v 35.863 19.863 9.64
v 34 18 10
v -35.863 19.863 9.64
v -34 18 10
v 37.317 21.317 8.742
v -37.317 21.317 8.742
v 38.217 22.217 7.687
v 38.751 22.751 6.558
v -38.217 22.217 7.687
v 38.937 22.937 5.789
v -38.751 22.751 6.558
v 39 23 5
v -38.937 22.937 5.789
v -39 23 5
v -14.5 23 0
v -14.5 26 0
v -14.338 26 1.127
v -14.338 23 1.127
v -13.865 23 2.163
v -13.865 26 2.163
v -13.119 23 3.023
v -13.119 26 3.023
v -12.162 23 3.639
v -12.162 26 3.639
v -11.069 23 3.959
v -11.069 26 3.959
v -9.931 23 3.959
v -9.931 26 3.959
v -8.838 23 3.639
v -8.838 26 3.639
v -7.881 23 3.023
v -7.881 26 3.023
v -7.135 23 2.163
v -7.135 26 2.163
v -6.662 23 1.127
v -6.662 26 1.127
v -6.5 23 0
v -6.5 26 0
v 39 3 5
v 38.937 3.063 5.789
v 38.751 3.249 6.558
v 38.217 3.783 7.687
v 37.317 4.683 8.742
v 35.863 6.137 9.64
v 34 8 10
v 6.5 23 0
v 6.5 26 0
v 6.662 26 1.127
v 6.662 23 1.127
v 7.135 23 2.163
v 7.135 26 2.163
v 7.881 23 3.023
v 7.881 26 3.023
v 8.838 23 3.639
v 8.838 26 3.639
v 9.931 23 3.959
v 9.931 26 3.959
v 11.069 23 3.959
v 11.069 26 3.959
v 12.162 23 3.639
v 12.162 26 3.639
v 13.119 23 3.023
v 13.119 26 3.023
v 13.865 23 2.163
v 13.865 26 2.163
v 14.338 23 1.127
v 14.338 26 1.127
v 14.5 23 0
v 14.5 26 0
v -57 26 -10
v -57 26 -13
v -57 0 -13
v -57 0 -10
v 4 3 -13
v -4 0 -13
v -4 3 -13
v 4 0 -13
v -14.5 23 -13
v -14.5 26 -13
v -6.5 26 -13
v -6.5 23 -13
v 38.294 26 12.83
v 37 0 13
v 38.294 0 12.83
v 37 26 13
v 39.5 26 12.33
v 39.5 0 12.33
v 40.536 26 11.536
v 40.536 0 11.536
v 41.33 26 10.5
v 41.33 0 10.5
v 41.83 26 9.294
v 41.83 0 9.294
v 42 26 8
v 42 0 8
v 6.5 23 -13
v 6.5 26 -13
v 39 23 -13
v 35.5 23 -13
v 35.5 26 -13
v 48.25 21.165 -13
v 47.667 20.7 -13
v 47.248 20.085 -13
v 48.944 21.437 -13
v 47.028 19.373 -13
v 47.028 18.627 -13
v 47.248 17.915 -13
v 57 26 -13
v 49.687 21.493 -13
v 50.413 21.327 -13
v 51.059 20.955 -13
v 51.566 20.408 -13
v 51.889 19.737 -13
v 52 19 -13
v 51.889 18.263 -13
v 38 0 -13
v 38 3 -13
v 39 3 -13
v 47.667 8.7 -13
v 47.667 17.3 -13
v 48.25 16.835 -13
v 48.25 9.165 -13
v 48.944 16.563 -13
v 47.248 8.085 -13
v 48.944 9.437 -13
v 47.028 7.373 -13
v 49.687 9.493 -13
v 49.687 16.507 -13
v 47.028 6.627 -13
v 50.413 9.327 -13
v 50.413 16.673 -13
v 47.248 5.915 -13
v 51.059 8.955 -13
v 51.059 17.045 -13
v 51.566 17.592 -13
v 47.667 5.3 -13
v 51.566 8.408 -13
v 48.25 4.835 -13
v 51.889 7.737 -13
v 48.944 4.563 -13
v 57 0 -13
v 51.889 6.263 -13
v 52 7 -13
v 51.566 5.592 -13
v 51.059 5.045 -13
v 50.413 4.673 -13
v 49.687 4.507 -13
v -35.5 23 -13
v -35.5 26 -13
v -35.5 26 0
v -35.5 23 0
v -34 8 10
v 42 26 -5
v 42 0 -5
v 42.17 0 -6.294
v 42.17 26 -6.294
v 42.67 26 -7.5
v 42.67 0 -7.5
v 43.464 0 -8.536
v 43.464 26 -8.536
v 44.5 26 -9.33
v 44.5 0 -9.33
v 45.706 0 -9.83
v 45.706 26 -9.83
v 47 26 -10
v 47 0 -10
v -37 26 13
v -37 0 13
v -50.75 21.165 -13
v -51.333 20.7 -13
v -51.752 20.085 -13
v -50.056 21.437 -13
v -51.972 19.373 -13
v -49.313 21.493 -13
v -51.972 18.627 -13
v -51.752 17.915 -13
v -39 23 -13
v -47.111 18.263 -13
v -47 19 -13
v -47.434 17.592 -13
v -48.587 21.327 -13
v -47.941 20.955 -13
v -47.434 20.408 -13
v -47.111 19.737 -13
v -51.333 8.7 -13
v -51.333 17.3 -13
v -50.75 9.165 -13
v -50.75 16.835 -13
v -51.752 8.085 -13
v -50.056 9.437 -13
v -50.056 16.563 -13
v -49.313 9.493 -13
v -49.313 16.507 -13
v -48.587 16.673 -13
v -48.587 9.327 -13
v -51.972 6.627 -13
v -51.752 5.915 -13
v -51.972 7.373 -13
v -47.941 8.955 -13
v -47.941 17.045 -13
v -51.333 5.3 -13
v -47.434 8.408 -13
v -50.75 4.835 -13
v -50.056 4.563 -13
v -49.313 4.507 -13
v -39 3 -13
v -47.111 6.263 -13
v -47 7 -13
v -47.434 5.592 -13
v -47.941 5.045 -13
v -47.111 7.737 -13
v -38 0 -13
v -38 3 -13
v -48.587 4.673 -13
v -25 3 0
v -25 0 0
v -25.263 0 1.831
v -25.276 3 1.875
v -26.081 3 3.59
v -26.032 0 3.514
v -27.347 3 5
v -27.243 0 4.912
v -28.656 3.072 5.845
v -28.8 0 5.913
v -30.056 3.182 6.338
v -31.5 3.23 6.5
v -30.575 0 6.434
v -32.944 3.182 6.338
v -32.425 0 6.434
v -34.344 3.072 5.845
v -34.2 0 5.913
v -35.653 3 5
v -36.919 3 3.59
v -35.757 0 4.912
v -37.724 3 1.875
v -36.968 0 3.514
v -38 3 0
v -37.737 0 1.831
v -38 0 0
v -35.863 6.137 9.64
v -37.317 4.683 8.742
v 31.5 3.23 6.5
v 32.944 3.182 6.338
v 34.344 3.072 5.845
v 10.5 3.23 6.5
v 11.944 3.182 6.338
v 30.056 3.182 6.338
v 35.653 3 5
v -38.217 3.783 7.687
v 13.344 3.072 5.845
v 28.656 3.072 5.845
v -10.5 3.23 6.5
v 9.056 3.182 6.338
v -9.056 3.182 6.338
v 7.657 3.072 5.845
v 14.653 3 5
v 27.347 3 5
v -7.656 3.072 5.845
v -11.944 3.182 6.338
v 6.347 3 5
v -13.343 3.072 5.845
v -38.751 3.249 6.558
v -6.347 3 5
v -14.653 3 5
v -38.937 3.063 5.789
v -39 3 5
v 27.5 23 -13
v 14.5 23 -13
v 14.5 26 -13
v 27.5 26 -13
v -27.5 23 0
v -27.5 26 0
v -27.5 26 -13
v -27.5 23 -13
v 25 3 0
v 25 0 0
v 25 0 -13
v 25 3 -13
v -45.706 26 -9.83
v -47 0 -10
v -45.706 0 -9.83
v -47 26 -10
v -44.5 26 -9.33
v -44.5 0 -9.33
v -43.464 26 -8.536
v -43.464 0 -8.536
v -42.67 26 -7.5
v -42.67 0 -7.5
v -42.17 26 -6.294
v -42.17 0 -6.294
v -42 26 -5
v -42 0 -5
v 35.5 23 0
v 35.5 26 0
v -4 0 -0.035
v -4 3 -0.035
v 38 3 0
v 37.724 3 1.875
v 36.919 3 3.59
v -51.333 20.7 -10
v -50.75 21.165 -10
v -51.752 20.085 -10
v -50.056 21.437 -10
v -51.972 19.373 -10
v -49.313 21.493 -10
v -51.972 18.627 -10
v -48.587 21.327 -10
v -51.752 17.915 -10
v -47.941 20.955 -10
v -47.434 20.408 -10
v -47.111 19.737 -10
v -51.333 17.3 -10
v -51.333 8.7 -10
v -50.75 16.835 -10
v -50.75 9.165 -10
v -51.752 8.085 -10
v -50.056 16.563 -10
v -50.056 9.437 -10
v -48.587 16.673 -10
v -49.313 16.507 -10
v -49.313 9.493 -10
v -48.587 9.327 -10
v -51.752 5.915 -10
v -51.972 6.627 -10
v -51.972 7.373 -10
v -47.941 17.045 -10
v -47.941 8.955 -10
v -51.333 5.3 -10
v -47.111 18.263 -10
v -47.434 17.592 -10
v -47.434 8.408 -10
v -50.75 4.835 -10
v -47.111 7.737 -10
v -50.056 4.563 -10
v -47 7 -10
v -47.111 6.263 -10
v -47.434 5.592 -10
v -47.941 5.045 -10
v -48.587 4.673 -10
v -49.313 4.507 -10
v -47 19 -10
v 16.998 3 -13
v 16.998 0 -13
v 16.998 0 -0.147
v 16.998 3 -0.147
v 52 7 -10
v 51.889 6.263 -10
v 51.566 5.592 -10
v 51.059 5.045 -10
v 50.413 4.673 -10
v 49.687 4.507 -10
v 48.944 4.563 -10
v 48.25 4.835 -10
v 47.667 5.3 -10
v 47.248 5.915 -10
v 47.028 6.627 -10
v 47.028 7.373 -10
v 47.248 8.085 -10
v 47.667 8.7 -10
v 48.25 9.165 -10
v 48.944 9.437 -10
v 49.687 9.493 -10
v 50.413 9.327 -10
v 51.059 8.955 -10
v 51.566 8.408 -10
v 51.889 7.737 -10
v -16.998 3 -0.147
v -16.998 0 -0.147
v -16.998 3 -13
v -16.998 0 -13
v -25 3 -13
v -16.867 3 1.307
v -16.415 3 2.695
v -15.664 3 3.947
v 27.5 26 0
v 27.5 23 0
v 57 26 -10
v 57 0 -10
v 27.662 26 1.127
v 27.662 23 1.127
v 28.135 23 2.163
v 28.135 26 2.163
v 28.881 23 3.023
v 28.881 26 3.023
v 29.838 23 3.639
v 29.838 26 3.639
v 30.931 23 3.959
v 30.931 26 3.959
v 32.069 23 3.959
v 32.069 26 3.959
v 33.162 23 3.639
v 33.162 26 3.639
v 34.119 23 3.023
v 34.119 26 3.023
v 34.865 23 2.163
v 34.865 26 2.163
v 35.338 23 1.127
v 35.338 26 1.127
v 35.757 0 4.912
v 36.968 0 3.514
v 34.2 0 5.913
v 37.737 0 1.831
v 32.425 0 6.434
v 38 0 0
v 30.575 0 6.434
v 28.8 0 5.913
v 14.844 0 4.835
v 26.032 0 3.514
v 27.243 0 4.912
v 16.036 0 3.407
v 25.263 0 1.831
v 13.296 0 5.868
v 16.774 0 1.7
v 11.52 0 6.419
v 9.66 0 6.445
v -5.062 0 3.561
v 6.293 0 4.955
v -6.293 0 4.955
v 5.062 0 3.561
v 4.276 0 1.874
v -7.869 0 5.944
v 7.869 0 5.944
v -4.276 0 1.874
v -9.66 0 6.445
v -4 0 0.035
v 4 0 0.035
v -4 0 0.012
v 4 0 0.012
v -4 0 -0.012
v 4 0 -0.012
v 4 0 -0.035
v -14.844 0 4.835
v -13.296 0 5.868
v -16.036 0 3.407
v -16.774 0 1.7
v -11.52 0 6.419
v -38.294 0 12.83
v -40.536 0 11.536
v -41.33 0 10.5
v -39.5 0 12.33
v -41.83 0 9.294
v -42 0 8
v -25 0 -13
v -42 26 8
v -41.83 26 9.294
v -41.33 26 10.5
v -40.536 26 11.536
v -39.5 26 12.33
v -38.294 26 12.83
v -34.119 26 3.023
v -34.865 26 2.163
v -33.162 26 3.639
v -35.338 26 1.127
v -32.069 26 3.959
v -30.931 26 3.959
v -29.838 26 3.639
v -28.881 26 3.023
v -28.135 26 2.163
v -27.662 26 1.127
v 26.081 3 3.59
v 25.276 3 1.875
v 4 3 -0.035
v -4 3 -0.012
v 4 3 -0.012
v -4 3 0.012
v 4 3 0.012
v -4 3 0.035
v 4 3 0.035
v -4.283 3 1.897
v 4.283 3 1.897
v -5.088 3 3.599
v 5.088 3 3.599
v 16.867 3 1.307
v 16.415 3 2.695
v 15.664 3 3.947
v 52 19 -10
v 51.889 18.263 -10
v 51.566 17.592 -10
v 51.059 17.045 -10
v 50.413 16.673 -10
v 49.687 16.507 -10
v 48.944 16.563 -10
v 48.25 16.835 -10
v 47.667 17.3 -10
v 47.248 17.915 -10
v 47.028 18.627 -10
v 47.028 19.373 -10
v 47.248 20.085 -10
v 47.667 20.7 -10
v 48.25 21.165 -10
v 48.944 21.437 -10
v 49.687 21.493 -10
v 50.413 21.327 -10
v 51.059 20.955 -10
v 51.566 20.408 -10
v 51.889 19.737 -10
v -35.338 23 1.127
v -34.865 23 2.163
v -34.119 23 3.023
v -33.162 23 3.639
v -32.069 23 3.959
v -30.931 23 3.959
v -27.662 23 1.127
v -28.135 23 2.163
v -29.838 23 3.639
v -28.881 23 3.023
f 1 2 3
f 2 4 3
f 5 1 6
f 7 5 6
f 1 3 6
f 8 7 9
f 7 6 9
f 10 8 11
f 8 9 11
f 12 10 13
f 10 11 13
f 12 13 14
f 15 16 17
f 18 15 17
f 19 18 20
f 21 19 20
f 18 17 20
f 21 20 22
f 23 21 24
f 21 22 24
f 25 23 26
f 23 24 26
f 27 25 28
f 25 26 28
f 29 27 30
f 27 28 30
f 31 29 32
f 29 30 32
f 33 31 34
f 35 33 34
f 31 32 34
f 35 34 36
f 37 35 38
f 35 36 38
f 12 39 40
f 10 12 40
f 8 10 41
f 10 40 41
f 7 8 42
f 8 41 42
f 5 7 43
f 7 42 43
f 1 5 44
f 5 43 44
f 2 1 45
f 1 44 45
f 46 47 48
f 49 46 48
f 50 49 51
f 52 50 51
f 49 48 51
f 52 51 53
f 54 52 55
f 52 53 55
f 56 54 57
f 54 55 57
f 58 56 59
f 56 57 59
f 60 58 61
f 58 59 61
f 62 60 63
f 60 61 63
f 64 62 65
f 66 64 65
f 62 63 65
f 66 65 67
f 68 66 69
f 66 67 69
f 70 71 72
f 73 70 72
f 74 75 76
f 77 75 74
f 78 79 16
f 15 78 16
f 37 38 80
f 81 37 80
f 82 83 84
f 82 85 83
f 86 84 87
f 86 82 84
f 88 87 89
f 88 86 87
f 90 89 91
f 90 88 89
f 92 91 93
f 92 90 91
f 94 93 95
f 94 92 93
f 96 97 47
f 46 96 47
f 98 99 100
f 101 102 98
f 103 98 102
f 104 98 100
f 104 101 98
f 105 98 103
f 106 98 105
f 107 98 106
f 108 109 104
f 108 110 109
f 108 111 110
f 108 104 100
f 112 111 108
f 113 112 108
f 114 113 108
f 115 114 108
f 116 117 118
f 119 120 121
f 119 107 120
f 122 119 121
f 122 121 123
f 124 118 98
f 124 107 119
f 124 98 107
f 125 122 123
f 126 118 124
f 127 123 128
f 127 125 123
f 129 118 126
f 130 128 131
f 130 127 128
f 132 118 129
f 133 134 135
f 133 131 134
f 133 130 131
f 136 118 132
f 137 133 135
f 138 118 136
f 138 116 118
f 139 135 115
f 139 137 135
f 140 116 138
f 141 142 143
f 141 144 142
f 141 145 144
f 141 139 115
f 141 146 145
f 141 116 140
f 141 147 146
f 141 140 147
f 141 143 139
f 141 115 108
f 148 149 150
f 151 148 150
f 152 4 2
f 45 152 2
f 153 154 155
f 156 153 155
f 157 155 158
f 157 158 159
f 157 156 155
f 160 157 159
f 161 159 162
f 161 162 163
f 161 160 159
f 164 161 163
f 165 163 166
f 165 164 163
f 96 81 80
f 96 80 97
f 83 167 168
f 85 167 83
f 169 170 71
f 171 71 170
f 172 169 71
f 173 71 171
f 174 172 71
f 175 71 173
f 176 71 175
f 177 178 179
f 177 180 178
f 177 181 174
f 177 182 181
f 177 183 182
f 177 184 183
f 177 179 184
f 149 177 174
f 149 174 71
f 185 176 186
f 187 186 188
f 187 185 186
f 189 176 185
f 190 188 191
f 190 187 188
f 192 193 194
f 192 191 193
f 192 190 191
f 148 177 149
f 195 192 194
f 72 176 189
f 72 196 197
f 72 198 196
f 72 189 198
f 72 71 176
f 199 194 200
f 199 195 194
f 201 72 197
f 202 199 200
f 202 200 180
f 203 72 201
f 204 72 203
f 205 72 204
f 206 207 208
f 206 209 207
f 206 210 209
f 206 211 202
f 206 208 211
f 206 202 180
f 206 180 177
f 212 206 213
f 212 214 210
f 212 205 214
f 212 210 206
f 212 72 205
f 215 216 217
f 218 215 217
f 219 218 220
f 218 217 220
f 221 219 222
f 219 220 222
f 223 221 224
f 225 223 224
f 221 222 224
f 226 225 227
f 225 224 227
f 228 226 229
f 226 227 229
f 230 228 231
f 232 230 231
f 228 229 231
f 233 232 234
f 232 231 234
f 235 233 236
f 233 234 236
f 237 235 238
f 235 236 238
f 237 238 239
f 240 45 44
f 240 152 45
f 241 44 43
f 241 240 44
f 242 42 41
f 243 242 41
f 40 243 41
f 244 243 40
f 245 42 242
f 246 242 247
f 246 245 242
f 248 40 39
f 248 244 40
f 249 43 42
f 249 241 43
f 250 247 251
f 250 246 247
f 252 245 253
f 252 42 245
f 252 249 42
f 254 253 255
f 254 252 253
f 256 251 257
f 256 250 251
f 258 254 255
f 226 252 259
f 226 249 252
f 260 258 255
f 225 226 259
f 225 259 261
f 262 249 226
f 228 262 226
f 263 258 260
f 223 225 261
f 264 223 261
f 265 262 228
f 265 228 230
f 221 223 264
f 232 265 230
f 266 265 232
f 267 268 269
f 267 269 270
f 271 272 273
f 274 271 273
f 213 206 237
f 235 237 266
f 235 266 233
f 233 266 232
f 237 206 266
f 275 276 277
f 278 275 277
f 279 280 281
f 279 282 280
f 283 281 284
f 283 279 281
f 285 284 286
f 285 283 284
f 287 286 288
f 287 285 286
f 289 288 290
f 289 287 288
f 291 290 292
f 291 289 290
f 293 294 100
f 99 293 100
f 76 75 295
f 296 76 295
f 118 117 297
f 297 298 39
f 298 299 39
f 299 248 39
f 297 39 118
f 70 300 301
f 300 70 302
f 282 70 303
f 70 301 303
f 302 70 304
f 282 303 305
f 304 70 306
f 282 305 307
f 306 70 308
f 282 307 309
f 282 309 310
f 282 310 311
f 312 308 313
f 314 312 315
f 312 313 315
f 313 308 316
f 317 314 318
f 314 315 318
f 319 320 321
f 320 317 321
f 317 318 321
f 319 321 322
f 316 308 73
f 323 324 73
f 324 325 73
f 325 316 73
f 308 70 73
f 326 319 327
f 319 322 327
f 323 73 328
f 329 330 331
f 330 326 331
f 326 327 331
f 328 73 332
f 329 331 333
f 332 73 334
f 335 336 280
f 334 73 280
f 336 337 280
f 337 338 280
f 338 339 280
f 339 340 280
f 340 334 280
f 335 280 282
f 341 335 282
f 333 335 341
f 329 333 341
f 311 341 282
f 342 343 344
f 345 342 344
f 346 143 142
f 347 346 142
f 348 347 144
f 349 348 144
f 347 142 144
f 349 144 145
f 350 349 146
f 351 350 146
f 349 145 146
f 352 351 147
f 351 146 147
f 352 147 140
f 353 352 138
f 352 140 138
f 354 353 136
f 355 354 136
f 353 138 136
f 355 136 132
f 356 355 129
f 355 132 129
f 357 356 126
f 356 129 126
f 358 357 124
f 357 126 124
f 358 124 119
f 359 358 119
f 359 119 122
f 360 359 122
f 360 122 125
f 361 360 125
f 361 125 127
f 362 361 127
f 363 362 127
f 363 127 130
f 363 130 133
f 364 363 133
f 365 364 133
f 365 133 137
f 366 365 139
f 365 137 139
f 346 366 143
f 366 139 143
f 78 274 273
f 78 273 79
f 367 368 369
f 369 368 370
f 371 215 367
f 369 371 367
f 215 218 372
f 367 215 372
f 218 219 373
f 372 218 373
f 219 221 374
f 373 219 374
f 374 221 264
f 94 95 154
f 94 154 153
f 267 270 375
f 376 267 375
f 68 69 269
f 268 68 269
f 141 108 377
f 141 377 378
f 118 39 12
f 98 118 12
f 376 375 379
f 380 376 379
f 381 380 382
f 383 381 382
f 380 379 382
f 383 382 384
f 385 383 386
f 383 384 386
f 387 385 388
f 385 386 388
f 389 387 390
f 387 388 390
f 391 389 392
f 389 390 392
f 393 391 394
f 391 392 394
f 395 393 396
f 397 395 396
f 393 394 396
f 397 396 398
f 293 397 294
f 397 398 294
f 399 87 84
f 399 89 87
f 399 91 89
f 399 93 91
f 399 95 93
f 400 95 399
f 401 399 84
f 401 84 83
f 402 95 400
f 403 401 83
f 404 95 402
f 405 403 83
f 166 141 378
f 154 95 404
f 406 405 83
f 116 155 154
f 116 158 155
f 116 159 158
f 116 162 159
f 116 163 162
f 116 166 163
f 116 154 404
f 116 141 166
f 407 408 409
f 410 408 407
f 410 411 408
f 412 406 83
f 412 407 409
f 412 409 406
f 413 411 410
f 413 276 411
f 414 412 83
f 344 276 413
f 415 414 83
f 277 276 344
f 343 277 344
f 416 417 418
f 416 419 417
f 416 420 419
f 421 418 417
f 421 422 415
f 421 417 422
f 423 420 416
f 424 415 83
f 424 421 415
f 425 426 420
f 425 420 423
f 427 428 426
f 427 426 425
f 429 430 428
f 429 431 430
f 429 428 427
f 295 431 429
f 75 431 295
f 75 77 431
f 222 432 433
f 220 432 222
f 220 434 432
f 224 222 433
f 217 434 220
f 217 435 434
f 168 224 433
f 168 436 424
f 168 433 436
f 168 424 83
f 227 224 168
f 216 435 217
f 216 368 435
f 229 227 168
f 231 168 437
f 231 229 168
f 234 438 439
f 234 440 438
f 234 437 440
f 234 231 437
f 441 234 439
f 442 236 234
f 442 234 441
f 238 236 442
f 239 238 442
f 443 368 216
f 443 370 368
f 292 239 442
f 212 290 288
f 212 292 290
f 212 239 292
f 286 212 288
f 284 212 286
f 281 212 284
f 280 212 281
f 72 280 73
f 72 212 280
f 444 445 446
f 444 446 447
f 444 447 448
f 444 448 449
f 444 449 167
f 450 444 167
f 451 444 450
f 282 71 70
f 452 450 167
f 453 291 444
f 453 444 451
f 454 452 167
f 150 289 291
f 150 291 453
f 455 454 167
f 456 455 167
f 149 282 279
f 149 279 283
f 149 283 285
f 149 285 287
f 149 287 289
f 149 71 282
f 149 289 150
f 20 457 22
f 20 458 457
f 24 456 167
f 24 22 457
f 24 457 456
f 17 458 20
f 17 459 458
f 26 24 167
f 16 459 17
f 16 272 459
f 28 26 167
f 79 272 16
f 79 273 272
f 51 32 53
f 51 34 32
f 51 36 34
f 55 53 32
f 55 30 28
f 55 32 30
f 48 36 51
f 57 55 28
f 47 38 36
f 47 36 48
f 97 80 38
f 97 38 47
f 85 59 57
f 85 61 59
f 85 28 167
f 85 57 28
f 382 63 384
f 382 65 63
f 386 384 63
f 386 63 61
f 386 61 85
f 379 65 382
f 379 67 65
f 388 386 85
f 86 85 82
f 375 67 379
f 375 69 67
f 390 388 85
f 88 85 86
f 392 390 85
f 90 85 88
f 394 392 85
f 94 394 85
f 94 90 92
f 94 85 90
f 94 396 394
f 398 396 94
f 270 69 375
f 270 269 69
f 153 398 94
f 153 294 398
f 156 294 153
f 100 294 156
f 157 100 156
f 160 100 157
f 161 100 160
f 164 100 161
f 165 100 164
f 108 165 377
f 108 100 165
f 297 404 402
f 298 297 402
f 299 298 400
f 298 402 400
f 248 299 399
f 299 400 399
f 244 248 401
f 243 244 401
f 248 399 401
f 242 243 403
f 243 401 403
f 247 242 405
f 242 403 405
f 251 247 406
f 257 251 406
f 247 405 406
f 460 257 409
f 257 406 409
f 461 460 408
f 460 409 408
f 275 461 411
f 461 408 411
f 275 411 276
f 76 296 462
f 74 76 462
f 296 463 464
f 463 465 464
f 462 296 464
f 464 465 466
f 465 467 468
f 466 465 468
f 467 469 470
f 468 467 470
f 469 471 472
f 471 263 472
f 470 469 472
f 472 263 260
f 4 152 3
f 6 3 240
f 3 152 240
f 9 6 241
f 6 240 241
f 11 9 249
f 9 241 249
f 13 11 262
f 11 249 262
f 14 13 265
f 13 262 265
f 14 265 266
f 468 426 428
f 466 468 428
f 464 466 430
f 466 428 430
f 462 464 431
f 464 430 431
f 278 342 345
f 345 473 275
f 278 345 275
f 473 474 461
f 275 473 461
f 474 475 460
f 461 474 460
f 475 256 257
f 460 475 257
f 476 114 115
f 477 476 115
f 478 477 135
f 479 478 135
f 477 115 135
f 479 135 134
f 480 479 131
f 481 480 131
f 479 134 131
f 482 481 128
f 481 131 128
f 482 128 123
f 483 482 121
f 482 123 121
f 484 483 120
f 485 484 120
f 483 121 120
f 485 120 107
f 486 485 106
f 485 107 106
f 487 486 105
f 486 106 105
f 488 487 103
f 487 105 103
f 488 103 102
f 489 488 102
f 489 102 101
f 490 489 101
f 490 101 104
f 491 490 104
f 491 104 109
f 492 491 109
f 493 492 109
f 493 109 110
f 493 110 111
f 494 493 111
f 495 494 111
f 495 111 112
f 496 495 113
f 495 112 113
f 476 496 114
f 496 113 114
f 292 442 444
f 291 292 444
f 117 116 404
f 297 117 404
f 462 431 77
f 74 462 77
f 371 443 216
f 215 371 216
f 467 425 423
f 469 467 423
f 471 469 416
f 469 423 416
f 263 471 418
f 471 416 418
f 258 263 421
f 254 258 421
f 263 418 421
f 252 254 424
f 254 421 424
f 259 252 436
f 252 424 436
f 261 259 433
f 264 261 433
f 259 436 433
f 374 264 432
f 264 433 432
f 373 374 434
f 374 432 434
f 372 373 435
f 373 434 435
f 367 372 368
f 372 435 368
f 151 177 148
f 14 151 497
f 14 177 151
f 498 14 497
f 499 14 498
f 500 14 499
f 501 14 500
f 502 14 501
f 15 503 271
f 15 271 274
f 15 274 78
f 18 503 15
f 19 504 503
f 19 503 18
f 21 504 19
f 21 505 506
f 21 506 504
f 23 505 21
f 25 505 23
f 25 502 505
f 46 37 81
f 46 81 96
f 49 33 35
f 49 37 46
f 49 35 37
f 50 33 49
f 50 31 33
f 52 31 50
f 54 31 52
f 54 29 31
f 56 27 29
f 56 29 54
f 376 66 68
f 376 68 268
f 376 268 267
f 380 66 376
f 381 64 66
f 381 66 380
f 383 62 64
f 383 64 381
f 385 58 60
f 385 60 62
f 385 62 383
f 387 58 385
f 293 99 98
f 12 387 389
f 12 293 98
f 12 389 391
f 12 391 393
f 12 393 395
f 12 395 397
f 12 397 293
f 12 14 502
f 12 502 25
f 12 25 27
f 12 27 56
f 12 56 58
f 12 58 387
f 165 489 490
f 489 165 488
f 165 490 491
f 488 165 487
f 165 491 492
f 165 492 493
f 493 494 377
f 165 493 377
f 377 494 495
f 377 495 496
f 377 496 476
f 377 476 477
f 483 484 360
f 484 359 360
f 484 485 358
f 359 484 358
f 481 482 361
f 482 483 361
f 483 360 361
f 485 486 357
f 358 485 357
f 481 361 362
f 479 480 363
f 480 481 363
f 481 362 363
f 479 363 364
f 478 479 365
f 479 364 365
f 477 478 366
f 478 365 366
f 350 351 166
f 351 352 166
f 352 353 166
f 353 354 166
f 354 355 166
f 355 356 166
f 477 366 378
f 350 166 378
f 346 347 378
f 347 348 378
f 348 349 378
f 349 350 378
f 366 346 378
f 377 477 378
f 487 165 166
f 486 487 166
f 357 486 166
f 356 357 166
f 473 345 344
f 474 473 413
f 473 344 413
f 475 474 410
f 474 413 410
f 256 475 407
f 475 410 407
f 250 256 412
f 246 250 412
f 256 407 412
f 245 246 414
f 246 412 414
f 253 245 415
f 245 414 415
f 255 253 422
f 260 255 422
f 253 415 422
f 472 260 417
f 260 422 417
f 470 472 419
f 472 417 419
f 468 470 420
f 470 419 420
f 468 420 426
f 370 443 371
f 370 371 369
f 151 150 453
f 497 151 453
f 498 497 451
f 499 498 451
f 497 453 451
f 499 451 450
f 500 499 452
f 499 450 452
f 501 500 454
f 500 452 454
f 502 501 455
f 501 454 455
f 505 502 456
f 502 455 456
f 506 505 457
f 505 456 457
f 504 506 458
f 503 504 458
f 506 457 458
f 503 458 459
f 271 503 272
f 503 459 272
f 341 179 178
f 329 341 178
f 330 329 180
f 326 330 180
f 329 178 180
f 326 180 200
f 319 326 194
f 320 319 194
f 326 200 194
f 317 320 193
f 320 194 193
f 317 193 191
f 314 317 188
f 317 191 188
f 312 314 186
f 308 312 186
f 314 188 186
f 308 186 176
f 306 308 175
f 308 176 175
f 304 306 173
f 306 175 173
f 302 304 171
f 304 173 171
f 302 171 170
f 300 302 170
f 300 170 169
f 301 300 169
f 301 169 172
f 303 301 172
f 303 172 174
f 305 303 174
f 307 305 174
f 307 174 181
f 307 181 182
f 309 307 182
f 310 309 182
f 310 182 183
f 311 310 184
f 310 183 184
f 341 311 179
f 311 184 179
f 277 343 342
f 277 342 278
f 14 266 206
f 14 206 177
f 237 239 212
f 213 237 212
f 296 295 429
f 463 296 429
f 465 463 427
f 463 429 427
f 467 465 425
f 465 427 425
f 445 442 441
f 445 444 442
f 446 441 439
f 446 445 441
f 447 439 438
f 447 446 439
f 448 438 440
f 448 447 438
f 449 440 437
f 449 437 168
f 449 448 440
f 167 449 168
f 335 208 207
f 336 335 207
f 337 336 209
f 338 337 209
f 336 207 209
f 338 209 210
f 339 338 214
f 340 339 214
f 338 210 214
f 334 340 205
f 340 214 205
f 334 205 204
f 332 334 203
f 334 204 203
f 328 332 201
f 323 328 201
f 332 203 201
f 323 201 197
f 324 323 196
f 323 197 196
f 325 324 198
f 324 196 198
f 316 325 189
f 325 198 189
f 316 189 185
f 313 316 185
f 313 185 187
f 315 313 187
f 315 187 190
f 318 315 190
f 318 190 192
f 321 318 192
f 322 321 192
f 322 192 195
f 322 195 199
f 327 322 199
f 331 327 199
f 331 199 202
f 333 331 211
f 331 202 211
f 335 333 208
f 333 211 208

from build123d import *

# Parameters (mm, degrees)
F1_W          = 84
F1_H          = 26
F2_DEPTH      = 13
F2_DEPTH_BACK = 13
F3_T          = -3
F5_W          = 15
F5_H          = 26
F5_R          = 2.5
F5_W_2        = 84
F5_W_3        = 78
F5_H_2        = 20
F6_DEPTH      = 3
F7_R          = 4.99999
F9_DEPTH      = 5
F10_DEPTH     = 25


# Not quite as in the source:
# - a fillet or chamfer is up to 0.001 mm smaller than in the source, because OpenCascade refuses the exact size


with BuildPart() as f2:
    # F1 (on Top) → F2 (new body, two sides)
    with BuildSketch(Plane.XY) as f2_sk:
        with Locations((0, 13)):
            Rectangle(F1_W, F1_H)
    extrude(amount=F2_DEPTH)
    extrude(f2_sk.sketch, amount=-F2_DEPTH_BACK)

    # F3
    f3_openings = [f2.faces().sort_by_distance(p)[0] for p in [
        (0, 13, -13),
    ]]
    offset(amount=F3_T, openings=f3_openings)

    # F5 (on face) → F6 (join)
    with BuildSketch(Plane(origin=(0, 0, -13), x_dir=(1, 0, 0), z_dir=(0, 0, -1))):
        with Locations((-49.5, -13)):
            Rectangle(F5_W, F5_H)
        with Locations((-49.5, -19)):
            Circle(F5_R, mode=Mode.SUBTRACT)
        with Locations((-49.5, -7)):
            Circle(F5_R, mode=Mode.SUBTRACT)
        with Locations((0, -13)):
            Rectangle(F5_W_2, F5_H)
        with Locations((0, -13)):
            Rectangle(F5_W_3, F5_H_2, mode=Mode.SUBTRACT)
        with Locations((49.5, -13)):
            Rectangle(F5_W, F5_H)
        with Locations((49.5, -19)):
            Circle(F5_R, mode=Mode.SUBTRACT)
        with Locations((49.5, -7)):
            Circle(F5_R, mode=Mode.SUBTRACT)
    extrude(amount=-F6_DEPTH)

    # F7 (radius 5 in the source; OpenCascade refuses exactly that, so slightly less here)
    f7_edges = [f2.edges().sort_by_distance(p)[0] for p in [
        (-42, 13, 13),
        (42, 13, 13),
        (-42, 13, -10),
        (42, 13, -10),
        (0, 23, 10),
        (0, 3, 10),
        (-39, 13, 10),
        (39, 13, 10),
    ]]
    fillet(f7_edges, radius=F7_R)

    # F8 (on face) → F9 (cut)
    with BuildSketch(Plane.XZ):
        with BuildLine():
            Line((-25, -11), (-25, 0))
            ThreePointArc((-25, 0), (-31.5, 6.5), (-38, 0))
            Line((-38, 0), (-38, -11))
            Line((-38, -11), (-38, -13))
            Line((-38, -13), (-25, -13))
            Line((-25, -13), (-25, -11))
        make_face()
        with BuildLine():
            Line((-4.0000936475, -11), (-4.0000936475, -0.0348913798))
            ThreePointArc((-4.0000936475, -0.0348913798), (-4, 0), (-4.0000936475, 0.0348913798))
            ThreePointArc((-4.0000936475, 0.0348913798), (-10.5909716955, 6.499363365), (-16.9983365331, -0.1470452389))
            Line((-16.9983365331, -0.1470452389), (-16.9983365331, -10.9773843356))
            Line((-16.9983365331, -10.9773843356), (-16.9983365331, -13))
            Line((-16.9983365331, -13), (-4.0000936475, -13))
            Line((-4.0000936475, -13), (-4.0000936475, -11))
        make_face()
        with BuildLine():
            ThreePointArc((4.0000936475, 0.0348913798), (4, 0), (4.0000936475, -0.0348913798))
            Line((4.0000936475, -0.0348913798), (4.0000936475, -11))
            Line((4.0000936475, -11), (4.0000936475, -13))
            Line((4.0000936475, -13), (16.9983365331, -13))
            Line((16.9983365331, -13), (16.9983365331, -10.9773843356))
            Line((16.9983365331, -10.9773843356), (16.9983365331, -0.1470452389))
            ThreePointArc((16.9983365331, -0.1470452389), (10.5909716955, 6.499363365), (4.0000936475, 0.0348913798))
        make_face()
        with BuildLine():
            ThreePointArc((38, 0), (31.5, 6.5), (25, 0))
            Line((25, 0), (25, -11))
            Line((25, -11), (25, -13))
            Line((25, -13), (38, -13))
            Line((38, -13), (38, -11))
            Line((38, -11), (38, 0))
        make_face()
    extrude(amount=-F9_DEPTH, mode=Mode.SUBTRACT)

    # F4 (on face) → F10 (cut)
    with BuildSketch(Plane(origin=(0, 26, 0), x_dir=(-1, 0, 0), z_dir=(0, 1, 0))):
        with BuildLine():
            Line((-6.5, -13), (-6.5, 0))
            ThreePointArc((-6.5, 0), (-10.5, 4), (-14.5, 0))
            Line((-14.5, 0), (-14.5, -13))
            Line((-14.5, -13), (-6.5, -13))
        make_face()
        with BuildLine():
            Line((-27.5, -13), (-27.5, 0))
            ThreePointArc((-27.5, 0), (-31.5, 4), (-35.5, 0))
            Line((-35.5, 0), (-35.5, -13))
            Line((-35.5, -13), (-27.5, -13))
        make_face()
        with BuildLine():
            ThreePointArc((14.5, 0), (10.5, 4), (6.5, 0))
            Line((6.5, 0), (6.5, -13))
            Line((6.5, -13), (14.5, -13))
            Line((14.5, -13), (14.5, 0))
        make_face()
        with BuildLine():
            ThreePointArc((35.5, 0), (31.5, 4), (27.5, 0))
            Line((27.5, 0), (27.5, -13))
            Line((27.5, -13), (35.5, -13))
            Line((35.5, -13), (35.5, 0))
        make_face()
    extrude(amount=-F10_DEPTH, mode=Mode.SUBTRACT)


solid = f2.part
